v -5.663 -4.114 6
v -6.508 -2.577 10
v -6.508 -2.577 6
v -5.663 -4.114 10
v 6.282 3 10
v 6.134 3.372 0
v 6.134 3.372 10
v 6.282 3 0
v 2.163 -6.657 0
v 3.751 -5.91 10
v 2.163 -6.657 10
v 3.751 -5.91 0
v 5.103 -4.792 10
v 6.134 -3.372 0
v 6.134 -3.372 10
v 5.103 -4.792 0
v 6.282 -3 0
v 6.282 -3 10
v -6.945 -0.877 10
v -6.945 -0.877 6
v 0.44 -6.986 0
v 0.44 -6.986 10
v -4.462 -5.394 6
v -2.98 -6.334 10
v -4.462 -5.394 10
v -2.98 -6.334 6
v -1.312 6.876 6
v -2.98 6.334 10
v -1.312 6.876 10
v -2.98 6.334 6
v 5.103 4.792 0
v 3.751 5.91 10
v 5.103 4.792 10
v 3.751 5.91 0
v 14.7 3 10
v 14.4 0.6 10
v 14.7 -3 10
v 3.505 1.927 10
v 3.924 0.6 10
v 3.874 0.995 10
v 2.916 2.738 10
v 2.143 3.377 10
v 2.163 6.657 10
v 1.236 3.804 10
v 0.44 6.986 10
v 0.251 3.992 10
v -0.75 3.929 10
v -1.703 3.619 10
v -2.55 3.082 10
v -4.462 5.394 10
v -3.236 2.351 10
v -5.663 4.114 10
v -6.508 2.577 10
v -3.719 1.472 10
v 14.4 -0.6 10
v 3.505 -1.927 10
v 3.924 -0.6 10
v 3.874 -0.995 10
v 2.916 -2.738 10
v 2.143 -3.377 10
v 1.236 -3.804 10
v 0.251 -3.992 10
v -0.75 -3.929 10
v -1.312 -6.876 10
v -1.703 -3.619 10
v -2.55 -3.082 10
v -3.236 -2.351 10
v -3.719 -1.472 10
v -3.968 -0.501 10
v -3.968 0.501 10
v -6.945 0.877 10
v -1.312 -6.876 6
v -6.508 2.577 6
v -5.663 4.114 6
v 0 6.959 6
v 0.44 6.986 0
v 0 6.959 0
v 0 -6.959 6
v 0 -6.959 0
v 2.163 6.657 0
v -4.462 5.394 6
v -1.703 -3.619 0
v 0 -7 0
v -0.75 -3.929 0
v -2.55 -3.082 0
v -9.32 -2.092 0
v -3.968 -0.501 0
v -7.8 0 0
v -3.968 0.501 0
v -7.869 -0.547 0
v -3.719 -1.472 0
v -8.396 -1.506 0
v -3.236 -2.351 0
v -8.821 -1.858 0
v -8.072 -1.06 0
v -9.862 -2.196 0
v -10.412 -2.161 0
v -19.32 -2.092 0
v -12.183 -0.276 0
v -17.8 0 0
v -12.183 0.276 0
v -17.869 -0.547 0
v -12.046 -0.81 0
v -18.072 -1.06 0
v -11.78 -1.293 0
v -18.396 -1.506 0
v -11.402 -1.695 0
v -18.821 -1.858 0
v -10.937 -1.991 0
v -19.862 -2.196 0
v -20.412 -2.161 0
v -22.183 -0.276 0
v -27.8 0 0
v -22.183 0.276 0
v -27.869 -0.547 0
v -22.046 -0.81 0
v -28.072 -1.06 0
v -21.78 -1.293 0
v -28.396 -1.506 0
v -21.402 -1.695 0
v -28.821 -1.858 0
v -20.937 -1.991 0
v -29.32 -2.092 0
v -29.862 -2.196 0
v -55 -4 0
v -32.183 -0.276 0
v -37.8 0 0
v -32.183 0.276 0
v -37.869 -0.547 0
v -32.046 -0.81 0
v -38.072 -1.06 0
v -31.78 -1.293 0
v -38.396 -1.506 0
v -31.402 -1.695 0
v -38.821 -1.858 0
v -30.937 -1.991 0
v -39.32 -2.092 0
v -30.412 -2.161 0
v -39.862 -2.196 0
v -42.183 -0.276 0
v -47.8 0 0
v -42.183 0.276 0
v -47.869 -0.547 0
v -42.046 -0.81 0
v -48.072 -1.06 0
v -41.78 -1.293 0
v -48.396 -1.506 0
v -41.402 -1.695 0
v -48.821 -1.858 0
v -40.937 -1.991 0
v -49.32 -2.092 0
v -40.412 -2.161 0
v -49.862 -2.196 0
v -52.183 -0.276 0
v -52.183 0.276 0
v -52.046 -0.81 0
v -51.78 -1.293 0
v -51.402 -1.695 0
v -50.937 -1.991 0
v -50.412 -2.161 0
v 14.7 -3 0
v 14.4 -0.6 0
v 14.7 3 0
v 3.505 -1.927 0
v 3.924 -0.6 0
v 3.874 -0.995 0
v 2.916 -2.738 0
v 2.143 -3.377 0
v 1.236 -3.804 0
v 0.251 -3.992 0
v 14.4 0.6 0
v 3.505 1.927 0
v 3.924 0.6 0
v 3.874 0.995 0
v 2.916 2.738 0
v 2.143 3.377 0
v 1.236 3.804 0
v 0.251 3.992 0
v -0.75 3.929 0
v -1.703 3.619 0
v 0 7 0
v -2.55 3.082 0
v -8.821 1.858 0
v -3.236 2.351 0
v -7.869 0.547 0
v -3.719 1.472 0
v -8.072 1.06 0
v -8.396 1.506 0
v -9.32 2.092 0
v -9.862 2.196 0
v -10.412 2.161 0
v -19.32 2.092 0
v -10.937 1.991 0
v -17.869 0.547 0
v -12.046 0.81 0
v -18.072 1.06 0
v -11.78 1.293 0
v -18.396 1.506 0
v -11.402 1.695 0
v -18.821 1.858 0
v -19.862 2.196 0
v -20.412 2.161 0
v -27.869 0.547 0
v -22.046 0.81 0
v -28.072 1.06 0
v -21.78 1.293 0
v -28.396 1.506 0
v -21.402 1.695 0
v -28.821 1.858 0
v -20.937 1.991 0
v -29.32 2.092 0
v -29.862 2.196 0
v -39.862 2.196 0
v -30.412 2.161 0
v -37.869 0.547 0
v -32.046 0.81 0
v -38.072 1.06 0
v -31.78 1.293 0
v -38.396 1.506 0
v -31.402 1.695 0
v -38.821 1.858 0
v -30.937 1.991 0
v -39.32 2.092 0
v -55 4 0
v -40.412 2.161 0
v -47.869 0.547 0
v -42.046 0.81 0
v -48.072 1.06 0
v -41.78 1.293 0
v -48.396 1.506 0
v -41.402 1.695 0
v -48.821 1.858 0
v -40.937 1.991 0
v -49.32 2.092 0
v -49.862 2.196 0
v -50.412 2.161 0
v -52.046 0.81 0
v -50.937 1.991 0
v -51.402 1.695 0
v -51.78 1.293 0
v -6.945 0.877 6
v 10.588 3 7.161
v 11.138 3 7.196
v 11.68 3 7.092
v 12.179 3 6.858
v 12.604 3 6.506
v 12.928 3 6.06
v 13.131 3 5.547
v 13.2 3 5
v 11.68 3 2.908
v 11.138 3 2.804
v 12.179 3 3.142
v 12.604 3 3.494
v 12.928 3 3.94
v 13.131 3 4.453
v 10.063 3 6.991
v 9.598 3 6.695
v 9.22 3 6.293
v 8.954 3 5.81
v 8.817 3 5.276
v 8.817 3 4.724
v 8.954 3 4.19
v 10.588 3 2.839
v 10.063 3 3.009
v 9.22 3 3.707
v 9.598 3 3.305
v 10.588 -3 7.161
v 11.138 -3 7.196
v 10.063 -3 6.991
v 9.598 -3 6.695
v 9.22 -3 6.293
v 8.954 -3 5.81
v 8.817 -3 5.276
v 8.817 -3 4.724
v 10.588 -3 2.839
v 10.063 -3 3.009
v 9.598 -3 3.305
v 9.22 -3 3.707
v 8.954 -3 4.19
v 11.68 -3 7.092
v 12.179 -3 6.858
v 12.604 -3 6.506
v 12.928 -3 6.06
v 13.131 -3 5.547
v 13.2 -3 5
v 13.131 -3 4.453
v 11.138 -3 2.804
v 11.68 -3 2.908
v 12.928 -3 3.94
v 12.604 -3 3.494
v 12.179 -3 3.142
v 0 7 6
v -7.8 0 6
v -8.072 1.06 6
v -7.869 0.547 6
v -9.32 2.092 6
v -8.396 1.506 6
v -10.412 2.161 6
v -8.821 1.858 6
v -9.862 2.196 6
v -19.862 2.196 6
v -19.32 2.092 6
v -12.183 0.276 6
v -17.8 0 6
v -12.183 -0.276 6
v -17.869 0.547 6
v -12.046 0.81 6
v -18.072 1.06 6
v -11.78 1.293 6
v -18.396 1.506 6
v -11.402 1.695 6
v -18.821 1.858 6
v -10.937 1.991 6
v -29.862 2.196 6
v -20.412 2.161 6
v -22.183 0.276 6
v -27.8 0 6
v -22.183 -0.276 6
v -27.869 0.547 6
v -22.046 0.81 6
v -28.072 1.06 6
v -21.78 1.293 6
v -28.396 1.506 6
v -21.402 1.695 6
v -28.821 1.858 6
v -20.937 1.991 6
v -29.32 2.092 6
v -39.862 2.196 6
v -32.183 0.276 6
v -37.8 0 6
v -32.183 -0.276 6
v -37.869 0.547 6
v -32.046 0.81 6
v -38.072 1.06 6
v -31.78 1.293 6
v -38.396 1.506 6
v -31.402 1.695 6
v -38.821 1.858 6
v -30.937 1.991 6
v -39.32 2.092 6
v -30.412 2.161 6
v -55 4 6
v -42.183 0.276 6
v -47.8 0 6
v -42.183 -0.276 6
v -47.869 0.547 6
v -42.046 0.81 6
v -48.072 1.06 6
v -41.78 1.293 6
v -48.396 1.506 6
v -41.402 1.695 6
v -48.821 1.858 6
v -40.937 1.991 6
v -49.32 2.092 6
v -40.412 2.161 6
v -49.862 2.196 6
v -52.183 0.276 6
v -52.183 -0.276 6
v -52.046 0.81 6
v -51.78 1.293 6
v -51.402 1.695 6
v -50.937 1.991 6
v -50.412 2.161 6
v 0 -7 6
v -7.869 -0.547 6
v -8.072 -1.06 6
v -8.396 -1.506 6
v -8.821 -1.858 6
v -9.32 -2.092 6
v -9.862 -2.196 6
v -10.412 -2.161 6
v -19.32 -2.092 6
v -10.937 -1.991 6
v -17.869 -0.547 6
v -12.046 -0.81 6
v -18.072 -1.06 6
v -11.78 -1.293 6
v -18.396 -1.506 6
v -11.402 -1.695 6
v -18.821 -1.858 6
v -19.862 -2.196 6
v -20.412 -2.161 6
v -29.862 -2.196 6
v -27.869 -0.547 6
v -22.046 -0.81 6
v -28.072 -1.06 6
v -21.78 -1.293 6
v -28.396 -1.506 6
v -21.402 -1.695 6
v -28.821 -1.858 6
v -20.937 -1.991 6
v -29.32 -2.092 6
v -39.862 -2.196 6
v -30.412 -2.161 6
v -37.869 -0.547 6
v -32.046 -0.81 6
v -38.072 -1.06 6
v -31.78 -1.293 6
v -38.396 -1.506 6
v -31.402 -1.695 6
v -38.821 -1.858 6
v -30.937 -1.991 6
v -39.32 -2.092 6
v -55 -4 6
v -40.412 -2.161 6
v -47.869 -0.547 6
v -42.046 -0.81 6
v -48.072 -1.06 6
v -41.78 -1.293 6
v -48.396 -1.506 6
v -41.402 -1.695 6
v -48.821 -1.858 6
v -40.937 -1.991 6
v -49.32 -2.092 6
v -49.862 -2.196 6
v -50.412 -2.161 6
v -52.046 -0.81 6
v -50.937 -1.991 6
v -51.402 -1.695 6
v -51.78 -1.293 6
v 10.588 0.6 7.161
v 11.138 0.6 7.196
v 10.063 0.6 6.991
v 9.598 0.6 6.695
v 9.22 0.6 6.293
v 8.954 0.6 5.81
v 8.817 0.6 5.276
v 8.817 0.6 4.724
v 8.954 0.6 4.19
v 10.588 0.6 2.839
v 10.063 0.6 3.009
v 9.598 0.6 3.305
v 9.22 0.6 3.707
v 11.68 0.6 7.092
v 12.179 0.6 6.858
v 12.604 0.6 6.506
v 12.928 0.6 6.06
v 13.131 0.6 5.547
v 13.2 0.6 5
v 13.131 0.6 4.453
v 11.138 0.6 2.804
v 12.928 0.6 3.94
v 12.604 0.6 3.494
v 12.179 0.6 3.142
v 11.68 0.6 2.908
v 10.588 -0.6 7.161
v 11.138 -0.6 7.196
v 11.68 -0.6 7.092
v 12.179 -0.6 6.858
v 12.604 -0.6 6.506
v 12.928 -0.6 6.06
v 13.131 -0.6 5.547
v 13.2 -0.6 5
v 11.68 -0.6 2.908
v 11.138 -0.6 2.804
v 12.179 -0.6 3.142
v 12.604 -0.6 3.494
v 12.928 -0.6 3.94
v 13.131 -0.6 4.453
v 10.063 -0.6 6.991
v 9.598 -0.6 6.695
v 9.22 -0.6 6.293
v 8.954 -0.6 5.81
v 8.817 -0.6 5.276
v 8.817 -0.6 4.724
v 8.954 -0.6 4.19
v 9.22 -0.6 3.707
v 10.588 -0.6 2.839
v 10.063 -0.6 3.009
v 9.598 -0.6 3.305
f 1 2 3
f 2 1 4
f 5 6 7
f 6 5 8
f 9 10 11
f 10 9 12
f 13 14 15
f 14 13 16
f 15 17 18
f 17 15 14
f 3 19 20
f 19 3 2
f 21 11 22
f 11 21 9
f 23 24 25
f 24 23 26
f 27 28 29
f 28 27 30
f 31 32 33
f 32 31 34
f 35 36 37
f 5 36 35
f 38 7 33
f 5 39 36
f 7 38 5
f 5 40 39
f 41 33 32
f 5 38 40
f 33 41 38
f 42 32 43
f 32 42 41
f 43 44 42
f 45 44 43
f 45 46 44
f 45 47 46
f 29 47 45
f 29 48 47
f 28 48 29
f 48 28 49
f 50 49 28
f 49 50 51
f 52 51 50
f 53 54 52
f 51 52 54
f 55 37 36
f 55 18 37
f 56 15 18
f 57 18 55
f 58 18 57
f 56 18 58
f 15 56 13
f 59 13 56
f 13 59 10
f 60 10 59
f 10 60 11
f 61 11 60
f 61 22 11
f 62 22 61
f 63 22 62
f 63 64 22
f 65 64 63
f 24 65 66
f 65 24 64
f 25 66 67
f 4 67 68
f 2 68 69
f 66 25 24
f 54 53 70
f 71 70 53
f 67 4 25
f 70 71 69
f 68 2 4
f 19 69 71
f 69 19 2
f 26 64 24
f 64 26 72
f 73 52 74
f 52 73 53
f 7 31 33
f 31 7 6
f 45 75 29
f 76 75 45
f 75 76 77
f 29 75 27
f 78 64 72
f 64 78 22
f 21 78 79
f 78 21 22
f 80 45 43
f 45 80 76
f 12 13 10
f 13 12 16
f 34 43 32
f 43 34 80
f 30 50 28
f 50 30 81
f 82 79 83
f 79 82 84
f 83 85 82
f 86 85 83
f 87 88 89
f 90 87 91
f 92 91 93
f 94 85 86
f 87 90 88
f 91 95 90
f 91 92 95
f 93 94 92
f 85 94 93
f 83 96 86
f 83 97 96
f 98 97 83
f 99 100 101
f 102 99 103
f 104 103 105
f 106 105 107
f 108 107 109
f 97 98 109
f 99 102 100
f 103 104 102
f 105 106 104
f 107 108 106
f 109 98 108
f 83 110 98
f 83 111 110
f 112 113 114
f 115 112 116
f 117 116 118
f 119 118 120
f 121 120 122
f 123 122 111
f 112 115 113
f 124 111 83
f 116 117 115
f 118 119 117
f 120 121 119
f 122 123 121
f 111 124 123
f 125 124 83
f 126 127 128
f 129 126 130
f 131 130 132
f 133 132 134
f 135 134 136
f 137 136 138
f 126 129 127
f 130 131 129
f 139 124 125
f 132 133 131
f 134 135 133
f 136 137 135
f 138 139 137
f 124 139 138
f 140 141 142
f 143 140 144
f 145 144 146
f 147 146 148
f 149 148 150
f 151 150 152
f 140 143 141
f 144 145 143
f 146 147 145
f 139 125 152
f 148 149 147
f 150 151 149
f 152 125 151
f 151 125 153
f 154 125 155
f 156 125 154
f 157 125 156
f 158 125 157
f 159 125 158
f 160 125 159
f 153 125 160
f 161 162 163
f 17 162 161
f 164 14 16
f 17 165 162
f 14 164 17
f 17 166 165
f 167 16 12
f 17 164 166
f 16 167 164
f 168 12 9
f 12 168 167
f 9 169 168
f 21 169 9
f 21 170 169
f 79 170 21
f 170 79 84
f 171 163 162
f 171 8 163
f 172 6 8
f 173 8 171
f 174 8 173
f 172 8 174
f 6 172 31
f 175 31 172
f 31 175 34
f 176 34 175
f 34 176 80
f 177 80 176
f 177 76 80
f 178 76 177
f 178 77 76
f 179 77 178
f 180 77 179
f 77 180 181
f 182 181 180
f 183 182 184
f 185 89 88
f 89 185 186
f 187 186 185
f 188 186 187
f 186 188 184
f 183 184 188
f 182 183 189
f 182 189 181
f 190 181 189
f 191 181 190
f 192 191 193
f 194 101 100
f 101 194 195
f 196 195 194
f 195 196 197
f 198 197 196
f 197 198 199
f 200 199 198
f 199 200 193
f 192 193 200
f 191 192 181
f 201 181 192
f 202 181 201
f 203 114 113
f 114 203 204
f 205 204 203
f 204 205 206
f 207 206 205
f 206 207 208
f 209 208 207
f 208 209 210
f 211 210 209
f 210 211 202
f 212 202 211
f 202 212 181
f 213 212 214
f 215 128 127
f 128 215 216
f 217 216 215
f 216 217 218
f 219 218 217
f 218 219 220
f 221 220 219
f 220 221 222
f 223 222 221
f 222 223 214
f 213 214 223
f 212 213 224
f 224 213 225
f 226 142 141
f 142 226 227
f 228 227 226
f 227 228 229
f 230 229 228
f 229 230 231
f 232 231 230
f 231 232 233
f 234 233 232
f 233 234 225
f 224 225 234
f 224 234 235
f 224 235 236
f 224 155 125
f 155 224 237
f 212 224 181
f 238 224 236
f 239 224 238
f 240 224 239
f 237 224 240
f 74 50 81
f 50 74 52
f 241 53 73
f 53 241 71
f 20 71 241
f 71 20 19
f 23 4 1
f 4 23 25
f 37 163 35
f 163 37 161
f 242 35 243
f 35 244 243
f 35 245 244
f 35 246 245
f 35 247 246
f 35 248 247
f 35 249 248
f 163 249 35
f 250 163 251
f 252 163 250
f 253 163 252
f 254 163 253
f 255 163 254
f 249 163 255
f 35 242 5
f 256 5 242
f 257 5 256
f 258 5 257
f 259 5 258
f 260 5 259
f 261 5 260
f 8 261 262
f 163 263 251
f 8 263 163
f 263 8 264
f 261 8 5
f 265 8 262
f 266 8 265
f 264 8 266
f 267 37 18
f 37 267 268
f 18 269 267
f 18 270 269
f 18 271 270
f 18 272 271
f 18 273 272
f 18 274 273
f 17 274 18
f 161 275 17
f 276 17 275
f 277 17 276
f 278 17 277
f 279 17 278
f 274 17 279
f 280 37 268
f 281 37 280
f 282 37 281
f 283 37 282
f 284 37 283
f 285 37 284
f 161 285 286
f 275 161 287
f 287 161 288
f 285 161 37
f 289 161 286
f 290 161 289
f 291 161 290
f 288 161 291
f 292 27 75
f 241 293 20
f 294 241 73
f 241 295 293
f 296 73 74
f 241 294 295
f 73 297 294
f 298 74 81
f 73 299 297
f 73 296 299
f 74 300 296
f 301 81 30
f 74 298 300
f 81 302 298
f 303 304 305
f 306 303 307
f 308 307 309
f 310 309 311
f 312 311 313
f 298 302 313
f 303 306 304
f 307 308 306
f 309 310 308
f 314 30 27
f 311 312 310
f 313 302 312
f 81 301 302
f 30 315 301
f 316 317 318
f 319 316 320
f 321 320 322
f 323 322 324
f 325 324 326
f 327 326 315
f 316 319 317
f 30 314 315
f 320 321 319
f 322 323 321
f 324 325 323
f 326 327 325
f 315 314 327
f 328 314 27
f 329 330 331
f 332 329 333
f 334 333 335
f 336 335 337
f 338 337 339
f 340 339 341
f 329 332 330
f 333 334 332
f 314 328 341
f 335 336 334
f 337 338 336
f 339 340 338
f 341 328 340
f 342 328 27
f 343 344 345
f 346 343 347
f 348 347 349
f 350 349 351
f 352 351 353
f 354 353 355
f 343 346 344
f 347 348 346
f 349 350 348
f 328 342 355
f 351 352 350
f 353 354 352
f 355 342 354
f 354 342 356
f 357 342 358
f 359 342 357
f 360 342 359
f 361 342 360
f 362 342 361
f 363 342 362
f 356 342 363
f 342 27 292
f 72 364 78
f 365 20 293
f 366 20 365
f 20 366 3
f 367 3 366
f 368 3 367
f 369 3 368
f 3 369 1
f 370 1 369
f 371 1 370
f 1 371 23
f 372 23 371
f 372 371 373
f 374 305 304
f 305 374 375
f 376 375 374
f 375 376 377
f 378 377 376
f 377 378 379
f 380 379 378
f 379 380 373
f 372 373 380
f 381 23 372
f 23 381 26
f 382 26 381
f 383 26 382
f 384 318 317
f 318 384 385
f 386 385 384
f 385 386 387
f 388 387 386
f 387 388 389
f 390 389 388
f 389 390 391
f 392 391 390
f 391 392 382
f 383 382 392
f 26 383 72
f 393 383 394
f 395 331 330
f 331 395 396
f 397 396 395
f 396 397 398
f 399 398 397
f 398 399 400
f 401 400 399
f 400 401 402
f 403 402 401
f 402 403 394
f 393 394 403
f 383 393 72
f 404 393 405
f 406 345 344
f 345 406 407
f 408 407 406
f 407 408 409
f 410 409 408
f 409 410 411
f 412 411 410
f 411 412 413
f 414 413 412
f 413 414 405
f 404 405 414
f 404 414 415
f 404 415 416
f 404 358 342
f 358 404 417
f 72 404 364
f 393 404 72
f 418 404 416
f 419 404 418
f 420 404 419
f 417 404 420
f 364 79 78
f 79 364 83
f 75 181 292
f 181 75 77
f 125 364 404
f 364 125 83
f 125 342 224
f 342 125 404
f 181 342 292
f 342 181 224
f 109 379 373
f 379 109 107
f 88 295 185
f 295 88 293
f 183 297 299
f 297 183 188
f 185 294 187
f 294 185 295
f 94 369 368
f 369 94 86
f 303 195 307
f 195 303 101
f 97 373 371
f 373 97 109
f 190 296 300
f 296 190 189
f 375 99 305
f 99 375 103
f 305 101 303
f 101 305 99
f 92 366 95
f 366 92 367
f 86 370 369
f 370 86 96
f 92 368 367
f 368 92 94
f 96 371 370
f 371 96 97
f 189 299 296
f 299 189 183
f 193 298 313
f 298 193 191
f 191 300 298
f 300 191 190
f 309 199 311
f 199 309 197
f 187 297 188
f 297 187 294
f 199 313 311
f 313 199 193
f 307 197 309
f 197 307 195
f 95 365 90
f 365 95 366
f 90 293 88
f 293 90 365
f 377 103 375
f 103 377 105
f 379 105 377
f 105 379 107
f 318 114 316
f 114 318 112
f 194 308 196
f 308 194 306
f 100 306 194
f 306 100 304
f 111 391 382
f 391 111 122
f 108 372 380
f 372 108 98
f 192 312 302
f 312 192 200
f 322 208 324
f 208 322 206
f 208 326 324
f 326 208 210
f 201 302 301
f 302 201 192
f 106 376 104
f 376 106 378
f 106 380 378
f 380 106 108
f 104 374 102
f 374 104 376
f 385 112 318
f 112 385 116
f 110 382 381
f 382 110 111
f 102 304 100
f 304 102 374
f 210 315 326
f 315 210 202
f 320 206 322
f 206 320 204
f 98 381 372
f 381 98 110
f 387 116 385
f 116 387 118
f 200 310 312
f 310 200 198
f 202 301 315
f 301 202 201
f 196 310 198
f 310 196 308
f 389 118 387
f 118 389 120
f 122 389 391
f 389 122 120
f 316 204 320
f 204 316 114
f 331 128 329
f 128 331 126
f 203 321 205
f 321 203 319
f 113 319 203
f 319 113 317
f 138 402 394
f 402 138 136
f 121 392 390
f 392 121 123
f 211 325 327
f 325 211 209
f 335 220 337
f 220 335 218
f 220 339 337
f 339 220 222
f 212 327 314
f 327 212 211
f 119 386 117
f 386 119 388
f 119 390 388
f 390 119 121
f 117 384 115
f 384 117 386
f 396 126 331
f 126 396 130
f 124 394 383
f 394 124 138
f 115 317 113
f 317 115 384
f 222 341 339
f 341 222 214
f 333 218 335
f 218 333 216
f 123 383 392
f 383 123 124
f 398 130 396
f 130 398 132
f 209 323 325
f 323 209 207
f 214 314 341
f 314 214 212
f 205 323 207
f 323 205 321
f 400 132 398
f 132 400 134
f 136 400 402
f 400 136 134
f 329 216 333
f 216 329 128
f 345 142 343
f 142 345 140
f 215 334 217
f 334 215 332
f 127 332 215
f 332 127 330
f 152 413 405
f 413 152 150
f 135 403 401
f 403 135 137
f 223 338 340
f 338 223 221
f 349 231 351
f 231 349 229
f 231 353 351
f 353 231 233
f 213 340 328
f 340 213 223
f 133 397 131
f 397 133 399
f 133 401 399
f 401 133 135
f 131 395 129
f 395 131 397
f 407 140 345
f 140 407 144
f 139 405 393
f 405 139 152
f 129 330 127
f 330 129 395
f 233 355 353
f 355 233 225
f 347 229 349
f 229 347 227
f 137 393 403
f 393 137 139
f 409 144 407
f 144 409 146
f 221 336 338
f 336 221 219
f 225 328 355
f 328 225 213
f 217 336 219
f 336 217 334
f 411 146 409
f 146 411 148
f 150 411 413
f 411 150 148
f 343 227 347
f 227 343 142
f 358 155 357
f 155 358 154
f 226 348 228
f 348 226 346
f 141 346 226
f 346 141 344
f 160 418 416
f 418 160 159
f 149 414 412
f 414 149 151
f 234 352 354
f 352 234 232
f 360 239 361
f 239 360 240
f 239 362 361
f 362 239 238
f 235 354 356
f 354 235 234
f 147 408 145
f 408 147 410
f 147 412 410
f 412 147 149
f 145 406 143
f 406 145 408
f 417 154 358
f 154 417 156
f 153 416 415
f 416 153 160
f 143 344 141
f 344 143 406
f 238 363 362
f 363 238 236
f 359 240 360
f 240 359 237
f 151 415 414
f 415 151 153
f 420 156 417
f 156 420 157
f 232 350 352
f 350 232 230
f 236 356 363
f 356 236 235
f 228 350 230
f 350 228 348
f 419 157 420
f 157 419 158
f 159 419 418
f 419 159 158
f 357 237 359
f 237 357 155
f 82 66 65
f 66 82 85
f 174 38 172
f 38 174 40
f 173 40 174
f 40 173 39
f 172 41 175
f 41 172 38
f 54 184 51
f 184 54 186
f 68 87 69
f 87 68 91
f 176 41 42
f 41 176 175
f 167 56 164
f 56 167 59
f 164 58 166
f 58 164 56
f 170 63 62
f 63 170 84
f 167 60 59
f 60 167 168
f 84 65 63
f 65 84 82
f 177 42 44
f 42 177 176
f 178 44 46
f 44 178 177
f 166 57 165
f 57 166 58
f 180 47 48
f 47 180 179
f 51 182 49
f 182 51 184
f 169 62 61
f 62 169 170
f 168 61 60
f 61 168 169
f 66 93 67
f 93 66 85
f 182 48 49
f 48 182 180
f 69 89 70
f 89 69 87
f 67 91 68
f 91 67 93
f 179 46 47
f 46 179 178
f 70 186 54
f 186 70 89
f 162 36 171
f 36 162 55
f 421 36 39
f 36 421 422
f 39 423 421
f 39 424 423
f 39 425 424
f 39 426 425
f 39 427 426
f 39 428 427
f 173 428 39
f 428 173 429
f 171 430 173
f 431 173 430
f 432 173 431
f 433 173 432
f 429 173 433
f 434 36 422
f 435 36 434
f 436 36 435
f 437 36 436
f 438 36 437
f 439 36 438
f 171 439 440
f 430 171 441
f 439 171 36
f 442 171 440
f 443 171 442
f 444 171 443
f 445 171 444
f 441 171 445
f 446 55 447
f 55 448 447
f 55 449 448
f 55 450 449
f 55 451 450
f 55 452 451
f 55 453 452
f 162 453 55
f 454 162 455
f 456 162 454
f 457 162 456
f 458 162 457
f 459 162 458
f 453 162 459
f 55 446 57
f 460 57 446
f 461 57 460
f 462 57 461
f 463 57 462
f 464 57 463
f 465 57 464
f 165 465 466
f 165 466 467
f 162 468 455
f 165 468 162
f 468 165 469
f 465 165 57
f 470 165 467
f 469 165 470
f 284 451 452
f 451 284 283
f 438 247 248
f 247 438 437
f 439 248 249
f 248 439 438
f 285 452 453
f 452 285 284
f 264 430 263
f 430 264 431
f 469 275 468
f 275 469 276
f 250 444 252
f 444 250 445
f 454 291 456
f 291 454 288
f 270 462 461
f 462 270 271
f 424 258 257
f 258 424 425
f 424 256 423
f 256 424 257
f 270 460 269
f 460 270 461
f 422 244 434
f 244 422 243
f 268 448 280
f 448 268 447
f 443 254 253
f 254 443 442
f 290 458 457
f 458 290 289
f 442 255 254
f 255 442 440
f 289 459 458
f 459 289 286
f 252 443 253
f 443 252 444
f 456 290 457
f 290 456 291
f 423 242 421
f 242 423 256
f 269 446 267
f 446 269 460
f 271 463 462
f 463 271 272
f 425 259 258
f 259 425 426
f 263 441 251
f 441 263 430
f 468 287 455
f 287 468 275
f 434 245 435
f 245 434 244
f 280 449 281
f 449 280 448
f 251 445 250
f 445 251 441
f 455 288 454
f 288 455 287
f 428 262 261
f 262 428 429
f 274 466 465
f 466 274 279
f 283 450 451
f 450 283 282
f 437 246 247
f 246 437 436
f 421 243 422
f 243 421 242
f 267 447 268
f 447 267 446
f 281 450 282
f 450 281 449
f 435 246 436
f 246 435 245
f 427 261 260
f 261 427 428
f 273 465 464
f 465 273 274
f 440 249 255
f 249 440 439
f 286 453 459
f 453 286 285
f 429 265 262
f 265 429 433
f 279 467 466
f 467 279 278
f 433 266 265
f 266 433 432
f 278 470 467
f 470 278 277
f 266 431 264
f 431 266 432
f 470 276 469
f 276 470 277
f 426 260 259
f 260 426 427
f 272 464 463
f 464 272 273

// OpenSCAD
$fn = 25;
d_1 = 8.0; // axis diameter

r_1 = d_1 / 2 ; // - 0.2; // minus, as
r_2 = r_1 + 3.0;      // external
r_h = 4.0 / 2 + 0.2;

h_1 = 10.0;
h_f = 6.0;
hand_w = 8.0;
hand_l = 55.0;

difference() {
  union() {
    cylinder( r=r_2, h=h_1 );
    translate( [r_1,-3.0,0.0] ) cube( [10.7,6.0,h_1] );
    //translate( [-(r_1+hand_l),-hand_w/2,0.0] ) cube( [hand_l,hand_w,h_f] );  
    linear_extrude(h_f)
      polygon(points=[[0,r_2],[-hand_l,hand_w/2],[-hand_l,-hand_w/2],[0,-r_2]]);
  }
  cylinder( r=r_1, h=h_1 );
  translate( [r_1-1,-0.6,0.0] ) cube( [11.4,1.2,h_1] );
  translate([r_2+4.0,5.0,5.0]) rotate([90,0,0]) cylinder( r=r_h, h=10 );
  for(i=[10:10:50]) {
    translate([-i,0.0,0.0]) cylinder( r=r_h, h=6.0 );
  }
}
